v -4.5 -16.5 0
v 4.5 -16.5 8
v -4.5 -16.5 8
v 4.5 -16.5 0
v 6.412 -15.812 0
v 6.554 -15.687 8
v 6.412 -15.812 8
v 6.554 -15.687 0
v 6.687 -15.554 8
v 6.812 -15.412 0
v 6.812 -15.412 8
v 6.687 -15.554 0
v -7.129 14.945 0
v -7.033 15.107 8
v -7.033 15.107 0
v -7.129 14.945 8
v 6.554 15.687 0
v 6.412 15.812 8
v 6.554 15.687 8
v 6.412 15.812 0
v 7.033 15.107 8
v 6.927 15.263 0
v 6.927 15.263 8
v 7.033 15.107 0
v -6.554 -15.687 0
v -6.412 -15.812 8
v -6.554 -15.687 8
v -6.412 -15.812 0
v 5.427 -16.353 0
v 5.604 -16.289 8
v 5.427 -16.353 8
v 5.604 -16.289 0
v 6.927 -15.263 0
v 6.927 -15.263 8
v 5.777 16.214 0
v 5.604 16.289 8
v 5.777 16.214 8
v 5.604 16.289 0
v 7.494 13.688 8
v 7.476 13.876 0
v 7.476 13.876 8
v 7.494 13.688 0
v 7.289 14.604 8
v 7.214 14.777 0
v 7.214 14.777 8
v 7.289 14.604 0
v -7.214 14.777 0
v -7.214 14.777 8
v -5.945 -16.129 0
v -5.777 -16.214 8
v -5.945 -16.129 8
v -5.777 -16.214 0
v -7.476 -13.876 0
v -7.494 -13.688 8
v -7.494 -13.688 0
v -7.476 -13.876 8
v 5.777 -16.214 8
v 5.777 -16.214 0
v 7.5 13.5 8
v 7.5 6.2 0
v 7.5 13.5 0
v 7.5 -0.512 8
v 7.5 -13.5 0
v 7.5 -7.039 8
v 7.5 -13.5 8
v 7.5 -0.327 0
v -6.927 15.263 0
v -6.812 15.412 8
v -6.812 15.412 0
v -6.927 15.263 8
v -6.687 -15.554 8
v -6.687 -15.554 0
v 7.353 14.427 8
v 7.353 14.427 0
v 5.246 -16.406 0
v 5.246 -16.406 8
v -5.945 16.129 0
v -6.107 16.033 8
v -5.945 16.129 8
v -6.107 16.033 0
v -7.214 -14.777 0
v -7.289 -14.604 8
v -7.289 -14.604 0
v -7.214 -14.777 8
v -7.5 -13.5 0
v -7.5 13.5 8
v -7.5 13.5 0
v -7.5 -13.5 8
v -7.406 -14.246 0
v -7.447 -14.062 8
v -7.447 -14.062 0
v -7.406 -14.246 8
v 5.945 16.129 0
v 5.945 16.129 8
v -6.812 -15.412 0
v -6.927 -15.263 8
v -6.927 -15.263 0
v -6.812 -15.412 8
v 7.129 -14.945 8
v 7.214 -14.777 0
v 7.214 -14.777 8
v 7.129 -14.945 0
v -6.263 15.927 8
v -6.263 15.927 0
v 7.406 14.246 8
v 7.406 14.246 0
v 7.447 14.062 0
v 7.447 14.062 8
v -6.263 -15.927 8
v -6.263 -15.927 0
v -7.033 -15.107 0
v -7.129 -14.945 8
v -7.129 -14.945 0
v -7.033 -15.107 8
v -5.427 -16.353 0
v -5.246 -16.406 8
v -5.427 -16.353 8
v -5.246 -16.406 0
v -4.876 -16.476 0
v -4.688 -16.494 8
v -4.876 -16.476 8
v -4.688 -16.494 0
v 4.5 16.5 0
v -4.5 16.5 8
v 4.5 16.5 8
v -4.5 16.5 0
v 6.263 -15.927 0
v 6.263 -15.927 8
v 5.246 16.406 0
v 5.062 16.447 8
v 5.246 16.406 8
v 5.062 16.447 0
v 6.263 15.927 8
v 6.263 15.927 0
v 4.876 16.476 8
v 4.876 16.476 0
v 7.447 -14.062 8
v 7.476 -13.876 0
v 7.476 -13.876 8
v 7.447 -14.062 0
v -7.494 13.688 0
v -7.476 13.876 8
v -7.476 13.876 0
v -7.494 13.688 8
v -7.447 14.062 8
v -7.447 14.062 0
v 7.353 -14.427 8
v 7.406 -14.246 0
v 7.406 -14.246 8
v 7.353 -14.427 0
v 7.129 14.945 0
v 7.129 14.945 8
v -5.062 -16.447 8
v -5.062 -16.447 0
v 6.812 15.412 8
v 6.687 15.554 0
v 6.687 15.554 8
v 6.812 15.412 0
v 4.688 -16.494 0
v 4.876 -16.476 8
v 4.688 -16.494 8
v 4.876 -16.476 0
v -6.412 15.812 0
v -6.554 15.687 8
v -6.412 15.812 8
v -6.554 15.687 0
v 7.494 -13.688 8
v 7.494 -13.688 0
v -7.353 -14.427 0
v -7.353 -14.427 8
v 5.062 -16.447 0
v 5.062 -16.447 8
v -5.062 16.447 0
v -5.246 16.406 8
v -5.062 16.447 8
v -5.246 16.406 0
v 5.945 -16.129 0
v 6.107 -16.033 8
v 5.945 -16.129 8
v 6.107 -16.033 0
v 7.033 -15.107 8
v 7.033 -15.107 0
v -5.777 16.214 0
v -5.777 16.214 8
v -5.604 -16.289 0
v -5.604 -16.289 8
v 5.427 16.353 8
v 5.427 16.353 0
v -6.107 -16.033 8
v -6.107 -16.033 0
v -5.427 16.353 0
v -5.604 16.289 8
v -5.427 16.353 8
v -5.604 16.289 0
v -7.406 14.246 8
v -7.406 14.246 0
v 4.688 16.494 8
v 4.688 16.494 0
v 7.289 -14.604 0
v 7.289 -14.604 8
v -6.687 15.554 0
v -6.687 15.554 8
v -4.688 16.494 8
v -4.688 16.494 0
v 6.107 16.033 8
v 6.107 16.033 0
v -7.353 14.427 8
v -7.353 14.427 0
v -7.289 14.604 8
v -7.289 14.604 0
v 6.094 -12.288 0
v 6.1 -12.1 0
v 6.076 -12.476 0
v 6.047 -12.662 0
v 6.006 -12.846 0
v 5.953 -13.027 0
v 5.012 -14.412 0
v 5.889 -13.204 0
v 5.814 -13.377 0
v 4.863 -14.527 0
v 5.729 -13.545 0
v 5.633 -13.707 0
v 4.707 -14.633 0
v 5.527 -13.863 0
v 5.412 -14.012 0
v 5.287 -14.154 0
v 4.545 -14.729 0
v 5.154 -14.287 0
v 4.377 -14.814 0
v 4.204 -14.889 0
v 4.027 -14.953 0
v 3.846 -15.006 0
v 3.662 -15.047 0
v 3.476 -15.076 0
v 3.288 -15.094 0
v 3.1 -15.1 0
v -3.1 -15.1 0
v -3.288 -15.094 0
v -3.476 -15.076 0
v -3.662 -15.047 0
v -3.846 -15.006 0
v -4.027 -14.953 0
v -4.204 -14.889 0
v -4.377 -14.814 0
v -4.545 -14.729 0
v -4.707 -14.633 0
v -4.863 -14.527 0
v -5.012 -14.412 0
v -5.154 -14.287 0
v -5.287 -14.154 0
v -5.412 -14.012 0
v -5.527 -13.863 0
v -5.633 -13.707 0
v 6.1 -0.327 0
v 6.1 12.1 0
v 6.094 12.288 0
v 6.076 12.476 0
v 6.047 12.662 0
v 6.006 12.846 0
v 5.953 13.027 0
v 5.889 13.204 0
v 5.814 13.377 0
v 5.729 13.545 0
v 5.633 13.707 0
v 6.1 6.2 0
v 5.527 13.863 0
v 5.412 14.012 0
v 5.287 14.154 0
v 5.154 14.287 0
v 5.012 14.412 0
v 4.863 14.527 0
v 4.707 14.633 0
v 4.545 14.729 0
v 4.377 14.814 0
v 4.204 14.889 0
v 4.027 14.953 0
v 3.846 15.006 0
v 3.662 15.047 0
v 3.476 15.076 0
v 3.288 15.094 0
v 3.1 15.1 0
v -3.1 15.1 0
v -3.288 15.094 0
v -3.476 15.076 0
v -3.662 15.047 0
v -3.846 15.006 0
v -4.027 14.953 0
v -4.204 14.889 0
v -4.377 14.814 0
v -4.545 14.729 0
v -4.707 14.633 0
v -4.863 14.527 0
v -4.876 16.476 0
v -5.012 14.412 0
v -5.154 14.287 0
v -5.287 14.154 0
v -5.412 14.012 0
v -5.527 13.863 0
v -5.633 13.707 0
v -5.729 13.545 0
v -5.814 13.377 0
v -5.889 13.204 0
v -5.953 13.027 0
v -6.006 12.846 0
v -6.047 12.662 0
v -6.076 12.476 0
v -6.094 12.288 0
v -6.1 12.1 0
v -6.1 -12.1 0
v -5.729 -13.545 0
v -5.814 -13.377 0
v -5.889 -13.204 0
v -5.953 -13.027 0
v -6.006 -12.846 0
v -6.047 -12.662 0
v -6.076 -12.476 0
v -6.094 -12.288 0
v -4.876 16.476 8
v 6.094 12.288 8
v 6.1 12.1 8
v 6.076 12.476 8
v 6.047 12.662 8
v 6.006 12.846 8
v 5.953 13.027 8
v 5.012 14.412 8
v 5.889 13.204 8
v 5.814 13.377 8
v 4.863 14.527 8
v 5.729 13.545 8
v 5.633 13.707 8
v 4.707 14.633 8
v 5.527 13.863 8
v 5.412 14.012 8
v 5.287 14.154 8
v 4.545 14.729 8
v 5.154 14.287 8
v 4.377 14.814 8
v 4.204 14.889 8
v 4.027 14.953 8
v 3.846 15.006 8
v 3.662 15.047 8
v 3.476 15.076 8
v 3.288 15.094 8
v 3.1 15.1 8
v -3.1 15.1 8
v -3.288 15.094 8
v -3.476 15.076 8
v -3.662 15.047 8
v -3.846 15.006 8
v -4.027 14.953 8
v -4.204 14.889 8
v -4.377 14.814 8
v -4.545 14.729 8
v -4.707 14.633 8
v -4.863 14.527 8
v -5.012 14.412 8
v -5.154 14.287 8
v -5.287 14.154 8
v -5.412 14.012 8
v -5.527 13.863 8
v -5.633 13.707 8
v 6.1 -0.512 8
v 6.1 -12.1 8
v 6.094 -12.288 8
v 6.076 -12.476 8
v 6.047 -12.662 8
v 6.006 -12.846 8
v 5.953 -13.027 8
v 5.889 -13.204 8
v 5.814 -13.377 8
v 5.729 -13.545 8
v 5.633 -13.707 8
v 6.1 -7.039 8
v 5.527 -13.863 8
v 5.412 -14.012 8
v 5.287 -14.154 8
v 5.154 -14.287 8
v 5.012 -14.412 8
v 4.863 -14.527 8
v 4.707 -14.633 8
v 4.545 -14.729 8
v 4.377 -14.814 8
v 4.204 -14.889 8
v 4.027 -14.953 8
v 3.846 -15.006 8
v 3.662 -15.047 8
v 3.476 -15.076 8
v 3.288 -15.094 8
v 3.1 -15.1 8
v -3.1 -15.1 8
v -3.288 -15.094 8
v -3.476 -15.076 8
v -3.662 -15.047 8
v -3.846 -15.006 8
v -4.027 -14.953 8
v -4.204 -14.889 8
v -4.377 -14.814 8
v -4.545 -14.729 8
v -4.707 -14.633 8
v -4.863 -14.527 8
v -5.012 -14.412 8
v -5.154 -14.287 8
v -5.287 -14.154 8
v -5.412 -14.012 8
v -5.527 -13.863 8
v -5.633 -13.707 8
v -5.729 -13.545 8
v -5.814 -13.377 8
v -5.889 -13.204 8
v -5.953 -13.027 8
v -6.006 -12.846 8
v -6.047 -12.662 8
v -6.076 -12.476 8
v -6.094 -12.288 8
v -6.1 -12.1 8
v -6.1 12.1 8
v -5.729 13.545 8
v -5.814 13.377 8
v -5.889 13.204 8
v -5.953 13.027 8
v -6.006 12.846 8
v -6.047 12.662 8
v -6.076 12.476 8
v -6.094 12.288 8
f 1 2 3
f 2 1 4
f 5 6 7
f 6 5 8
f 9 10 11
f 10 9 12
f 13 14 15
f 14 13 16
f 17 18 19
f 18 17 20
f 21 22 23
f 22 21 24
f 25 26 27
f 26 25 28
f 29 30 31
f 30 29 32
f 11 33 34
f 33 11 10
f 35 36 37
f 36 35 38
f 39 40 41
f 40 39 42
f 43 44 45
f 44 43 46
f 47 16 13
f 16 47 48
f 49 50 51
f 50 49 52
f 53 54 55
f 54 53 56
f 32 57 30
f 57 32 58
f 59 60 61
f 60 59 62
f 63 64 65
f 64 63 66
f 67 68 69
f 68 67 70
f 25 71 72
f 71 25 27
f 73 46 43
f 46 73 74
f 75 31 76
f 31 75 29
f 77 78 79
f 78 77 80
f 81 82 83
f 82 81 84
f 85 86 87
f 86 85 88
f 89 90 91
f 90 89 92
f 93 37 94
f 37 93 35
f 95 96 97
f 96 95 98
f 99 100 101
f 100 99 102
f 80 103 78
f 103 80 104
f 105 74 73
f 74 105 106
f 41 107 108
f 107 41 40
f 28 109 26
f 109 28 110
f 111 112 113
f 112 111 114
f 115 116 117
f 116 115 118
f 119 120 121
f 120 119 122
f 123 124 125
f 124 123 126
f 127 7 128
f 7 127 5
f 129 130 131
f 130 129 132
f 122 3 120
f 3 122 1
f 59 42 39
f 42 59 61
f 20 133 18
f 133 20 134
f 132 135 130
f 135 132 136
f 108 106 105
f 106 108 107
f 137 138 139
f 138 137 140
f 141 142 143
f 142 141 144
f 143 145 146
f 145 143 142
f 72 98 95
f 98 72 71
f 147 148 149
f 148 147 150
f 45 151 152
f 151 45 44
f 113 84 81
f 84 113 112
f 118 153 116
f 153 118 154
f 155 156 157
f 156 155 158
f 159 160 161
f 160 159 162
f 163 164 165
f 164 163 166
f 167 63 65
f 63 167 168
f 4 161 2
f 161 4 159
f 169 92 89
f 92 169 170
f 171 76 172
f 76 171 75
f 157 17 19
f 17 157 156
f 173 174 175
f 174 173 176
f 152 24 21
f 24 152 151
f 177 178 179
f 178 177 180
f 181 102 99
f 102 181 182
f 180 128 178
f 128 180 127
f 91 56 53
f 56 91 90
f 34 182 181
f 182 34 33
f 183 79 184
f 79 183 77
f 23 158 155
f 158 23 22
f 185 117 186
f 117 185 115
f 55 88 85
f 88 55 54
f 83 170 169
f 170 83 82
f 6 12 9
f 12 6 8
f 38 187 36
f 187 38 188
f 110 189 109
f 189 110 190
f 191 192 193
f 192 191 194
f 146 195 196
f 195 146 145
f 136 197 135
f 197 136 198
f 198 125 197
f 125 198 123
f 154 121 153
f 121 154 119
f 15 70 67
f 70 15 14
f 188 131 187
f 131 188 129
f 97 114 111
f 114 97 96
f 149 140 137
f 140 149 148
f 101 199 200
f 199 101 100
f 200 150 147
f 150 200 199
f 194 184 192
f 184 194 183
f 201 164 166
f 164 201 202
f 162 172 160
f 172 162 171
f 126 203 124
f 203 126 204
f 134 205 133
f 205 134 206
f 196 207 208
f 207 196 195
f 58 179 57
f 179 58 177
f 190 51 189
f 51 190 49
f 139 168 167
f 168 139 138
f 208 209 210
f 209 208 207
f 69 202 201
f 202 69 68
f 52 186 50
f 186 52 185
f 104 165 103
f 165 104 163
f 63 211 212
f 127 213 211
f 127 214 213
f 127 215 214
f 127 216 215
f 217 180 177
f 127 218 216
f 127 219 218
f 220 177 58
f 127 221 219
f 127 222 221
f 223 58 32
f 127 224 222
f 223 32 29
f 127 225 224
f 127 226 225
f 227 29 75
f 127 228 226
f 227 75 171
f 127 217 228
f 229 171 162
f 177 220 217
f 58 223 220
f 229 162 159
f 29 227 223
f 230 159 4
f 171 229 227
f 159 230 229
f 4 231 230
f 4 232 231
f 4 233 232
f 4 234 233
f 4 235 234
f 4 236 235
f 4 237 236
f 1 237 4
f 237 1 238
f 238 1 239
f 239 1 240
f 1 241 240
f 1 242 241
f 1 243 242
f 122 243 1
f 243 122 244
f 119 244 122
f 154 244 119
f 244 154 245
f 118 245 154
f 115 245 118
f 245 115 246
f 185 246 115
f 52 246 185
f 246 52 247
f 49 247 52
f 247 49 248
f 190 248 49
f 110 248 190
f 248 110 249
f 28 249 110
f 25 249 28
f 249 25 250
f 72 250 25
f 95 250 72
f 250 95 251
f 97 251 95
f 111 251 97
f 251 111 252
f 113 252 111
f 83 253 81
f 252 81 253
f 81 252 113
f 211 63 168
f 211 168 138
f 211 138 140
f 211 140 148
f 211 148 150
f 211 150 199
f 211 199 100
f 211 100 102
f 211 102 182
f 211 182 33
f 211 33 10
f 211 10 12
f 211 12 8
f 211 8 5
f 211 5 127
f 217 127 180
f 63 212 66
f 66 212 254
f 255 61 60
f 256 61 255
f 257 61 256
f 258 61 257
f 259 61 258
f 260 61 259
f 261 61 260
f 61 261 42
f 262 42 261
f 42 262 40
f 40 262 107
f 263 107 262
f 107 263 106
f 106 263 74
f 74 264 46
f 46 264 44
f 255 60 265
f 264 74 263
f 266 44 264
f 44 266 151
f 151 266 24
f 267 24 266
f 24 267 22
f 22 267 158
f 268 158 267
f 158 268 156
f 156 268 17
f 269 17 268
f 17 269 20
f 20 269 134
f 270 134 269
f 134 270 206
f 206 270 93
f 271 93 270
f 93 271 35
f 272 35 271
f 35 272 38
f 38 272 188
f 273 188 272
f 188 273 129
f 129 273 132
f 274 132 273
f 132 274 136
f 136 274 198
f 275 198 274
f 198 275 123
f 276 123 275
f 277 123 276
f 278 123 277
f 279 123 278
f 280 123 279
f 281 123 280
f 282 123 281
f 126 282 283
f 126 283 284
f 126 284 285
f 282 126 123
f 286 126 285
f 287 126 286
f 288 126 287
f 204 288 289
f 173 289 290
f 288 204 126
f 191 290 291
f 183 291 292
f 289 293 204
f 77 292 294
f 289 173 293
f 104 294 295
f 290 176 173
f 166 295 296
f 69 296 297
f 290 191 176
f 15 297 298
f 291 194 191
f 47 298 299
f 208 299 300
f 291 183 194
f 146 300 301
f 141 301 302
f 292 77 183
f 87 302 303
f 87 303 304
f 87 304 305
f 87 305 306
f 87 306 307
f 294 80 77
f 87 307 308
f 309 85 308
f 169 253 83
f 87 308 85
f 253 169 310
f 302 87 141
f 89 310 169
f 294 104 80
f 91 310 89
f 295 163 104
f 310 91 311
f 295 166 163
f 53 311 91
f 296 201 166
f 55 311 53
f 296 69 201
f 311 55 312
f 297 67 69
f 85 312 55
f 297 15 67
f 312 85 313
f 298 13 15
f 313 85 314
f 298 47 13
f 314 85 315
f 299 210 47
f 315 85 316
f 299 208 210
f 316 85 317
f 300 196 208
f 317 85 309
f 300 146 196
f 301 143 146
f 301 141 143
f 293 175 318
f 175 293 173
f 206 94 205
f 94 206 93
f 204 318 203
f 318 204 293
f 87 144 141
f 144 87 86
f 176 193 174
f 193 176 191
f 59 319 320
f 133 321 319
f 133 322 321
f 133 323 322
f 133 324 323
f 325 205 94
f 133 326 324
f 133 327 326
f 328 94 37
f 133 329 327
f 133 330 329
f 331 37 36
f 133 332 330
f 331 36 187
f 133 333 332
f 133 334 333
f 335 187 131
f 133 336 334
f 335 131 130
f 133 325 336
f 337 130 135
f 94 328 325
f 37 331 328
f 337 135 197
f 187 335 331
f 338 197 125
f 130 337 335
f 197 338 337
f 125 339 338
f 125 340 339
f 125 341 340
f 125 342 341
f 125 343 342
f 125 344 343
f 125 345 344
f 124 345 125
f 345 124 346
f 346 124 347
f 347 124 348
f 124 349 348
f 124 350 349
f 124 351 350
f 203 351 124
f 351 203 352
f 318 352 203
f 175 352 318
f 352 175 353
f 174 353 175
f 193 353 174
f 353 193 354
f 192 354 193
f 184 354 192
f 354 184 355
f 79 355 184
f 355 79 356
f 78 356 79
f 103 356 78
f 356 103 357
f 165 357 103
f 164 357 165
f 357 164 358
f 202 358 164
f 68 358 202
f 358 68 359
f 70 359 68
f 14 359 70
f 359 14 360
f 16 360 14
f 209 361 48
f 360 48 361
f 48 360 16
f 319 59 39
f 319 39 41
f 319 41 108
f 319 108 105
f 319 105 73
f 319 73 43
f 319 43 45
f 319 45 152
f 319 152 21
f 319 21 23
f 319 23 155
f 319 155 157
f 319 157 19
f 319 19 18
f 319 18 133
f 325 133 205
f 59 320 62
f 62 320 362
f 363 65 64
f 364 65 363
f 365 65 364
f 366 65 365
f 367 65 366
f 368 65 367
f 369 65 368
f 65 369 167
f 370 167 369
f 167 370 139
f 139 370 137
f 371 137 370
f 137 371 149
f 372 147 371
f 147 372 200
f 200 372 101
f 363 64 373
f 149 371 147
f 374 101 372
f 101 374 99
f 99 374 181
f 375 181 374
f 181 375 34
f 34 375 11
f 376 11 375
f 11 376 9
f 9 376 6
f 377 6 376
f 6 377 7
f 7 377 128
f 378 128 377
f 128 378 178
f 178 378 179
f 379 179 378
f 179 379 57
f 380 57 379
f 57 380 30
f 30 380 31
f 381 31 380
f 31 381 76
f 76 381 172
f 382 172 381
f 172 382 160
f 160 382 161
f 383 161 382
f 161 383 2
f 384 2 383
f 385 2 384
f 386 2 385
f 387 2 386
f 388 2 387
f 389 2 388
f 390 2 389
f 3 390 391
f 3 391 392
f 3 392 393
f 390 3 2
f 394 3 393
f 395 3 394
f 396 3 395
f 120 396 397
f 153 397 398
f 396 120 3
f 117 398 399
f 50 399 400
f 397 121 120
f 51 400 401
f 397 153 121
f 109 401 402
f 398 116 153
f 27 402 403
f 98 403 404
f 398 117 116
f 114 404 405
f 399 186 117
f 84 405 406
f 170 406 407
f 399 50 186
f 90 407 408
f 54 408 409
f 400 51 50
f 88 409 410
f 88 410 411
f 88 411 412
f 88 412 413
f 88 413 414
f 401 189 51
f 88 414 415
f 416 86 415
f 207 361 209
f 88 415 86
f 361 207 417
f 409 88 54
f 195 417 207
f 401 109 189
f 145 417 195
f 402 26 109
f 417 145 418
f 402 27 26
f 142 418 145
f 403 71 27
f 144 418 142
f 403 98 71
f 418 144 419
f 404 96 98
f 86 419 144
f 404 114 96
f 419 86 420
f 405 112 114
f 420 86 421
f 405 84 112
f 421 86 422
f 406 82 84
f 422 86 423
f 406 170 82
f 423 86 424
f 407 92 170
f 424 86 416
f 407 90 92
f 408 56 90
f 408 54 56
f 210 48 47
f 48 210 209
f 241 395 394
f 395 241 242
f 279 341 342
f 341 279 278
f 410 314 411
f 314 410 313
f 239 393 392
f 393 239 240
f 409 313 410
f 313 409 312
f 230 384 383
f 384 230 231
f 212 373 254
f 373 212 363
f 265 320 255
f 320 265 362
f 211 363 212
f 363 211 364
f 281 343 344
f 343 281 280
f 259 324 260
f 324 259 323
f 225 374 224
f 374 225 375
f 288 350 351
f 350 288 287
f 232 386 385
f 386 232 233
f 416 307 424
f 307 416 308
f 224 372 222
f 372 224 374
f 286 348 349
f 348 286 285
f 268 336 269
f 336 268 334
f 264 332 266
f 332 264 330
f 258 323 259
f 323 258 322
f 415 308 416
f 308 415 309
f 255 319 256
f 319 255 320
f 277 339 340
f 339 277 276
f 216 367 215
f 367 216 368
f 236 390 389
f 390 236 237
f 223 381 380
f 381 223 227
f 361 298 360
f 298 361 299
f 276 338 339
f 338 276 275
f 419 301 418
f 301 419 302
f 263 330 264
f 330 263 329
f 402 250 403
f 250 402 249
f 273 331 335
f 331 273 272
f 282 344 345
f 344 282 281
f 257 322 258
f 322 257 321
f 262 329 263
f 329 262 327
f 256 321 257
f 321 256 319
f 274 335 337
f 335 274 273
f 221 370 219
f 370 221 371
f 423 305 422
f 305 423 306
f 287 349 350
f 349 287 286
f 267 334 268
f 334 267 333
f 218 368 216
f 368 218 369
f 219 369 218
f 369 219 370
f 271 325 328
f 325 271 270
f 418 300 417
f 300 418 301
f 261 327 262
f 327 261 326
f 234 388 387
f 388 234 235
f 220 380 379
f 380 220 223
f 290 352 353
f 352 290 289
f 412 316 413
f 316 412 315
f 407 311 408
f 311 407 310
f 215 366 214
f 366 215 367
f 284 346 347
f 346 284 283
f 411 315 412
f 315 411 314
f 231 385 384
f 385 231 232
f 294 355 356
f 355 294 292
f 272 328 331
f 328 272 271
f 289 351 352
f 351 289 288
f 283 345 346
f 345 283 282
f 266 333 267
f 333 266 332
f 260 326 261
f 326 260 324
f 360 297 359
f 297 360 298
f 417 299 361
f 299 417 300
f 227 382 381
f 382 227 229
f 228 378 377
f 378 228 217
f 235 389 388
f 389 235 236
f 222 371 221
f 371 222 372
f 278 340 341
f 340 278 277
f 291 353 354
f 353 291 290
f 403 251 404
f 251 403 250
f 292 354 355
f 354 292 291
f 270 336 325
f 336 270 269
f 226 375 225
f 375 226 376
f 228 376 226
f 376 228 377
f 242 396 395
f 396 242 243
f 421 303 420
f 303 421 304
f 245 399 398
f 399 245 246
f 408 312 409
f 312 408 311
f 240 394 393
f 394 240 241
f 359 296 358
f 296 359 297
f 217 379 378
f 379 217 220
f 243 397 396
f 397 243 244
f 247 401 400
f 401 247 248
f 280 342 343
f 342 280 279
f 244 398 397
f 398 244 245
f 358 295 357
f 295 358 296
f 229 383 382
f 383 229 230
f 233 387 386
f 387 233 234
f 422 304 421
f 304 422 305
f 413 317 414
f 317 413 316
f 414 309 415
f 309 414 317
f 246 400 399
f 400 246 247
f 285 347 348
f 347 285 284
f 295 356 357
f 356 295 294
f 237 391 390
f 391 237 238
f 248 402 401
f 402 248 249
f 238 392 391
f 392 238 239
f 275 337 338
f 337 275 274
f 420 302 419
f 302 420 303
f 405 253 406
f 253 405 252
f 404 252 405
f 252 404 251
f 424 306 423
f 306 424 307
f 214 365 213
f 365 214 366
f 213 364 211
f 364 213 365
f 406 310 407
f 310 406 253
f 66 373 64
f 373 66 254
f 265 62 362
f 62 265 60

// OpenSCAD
// Depth
X = 15;//[5:100]

//Size
Y = 33;//[5:100]

//High
Z = 7;//[5:30]

//Wall thickness
Wall = 2.8;//[0.8,1.2,1.6,2,2.4,2.8]

//Cut hole for cables
CUT = 5;//[0:none,5,10,15]


/* [Hidden] */
$fn = 100;

module shape(x,y,z) {
    R=6;
    minkowski() {
        cube([x-R,y-R,z], center=true);
        cylinder(d=R);
    }
}

module piece(X,Y,Z,W, CUT=0){
    translate([0,0,Z/2])
    difference() {
        //Outer
        shape(X,Y,Z);
        //Inner
        shape(X-W,Y-W,Z+0.1);
        //Cut
        translate([X/2, 0, 0]) rotate([40,0,0]) cube([W+5, CUT, Z*5], center=true);
    }
}

//Create one piece
piece(X, Y, Z, Wall, CUT);
